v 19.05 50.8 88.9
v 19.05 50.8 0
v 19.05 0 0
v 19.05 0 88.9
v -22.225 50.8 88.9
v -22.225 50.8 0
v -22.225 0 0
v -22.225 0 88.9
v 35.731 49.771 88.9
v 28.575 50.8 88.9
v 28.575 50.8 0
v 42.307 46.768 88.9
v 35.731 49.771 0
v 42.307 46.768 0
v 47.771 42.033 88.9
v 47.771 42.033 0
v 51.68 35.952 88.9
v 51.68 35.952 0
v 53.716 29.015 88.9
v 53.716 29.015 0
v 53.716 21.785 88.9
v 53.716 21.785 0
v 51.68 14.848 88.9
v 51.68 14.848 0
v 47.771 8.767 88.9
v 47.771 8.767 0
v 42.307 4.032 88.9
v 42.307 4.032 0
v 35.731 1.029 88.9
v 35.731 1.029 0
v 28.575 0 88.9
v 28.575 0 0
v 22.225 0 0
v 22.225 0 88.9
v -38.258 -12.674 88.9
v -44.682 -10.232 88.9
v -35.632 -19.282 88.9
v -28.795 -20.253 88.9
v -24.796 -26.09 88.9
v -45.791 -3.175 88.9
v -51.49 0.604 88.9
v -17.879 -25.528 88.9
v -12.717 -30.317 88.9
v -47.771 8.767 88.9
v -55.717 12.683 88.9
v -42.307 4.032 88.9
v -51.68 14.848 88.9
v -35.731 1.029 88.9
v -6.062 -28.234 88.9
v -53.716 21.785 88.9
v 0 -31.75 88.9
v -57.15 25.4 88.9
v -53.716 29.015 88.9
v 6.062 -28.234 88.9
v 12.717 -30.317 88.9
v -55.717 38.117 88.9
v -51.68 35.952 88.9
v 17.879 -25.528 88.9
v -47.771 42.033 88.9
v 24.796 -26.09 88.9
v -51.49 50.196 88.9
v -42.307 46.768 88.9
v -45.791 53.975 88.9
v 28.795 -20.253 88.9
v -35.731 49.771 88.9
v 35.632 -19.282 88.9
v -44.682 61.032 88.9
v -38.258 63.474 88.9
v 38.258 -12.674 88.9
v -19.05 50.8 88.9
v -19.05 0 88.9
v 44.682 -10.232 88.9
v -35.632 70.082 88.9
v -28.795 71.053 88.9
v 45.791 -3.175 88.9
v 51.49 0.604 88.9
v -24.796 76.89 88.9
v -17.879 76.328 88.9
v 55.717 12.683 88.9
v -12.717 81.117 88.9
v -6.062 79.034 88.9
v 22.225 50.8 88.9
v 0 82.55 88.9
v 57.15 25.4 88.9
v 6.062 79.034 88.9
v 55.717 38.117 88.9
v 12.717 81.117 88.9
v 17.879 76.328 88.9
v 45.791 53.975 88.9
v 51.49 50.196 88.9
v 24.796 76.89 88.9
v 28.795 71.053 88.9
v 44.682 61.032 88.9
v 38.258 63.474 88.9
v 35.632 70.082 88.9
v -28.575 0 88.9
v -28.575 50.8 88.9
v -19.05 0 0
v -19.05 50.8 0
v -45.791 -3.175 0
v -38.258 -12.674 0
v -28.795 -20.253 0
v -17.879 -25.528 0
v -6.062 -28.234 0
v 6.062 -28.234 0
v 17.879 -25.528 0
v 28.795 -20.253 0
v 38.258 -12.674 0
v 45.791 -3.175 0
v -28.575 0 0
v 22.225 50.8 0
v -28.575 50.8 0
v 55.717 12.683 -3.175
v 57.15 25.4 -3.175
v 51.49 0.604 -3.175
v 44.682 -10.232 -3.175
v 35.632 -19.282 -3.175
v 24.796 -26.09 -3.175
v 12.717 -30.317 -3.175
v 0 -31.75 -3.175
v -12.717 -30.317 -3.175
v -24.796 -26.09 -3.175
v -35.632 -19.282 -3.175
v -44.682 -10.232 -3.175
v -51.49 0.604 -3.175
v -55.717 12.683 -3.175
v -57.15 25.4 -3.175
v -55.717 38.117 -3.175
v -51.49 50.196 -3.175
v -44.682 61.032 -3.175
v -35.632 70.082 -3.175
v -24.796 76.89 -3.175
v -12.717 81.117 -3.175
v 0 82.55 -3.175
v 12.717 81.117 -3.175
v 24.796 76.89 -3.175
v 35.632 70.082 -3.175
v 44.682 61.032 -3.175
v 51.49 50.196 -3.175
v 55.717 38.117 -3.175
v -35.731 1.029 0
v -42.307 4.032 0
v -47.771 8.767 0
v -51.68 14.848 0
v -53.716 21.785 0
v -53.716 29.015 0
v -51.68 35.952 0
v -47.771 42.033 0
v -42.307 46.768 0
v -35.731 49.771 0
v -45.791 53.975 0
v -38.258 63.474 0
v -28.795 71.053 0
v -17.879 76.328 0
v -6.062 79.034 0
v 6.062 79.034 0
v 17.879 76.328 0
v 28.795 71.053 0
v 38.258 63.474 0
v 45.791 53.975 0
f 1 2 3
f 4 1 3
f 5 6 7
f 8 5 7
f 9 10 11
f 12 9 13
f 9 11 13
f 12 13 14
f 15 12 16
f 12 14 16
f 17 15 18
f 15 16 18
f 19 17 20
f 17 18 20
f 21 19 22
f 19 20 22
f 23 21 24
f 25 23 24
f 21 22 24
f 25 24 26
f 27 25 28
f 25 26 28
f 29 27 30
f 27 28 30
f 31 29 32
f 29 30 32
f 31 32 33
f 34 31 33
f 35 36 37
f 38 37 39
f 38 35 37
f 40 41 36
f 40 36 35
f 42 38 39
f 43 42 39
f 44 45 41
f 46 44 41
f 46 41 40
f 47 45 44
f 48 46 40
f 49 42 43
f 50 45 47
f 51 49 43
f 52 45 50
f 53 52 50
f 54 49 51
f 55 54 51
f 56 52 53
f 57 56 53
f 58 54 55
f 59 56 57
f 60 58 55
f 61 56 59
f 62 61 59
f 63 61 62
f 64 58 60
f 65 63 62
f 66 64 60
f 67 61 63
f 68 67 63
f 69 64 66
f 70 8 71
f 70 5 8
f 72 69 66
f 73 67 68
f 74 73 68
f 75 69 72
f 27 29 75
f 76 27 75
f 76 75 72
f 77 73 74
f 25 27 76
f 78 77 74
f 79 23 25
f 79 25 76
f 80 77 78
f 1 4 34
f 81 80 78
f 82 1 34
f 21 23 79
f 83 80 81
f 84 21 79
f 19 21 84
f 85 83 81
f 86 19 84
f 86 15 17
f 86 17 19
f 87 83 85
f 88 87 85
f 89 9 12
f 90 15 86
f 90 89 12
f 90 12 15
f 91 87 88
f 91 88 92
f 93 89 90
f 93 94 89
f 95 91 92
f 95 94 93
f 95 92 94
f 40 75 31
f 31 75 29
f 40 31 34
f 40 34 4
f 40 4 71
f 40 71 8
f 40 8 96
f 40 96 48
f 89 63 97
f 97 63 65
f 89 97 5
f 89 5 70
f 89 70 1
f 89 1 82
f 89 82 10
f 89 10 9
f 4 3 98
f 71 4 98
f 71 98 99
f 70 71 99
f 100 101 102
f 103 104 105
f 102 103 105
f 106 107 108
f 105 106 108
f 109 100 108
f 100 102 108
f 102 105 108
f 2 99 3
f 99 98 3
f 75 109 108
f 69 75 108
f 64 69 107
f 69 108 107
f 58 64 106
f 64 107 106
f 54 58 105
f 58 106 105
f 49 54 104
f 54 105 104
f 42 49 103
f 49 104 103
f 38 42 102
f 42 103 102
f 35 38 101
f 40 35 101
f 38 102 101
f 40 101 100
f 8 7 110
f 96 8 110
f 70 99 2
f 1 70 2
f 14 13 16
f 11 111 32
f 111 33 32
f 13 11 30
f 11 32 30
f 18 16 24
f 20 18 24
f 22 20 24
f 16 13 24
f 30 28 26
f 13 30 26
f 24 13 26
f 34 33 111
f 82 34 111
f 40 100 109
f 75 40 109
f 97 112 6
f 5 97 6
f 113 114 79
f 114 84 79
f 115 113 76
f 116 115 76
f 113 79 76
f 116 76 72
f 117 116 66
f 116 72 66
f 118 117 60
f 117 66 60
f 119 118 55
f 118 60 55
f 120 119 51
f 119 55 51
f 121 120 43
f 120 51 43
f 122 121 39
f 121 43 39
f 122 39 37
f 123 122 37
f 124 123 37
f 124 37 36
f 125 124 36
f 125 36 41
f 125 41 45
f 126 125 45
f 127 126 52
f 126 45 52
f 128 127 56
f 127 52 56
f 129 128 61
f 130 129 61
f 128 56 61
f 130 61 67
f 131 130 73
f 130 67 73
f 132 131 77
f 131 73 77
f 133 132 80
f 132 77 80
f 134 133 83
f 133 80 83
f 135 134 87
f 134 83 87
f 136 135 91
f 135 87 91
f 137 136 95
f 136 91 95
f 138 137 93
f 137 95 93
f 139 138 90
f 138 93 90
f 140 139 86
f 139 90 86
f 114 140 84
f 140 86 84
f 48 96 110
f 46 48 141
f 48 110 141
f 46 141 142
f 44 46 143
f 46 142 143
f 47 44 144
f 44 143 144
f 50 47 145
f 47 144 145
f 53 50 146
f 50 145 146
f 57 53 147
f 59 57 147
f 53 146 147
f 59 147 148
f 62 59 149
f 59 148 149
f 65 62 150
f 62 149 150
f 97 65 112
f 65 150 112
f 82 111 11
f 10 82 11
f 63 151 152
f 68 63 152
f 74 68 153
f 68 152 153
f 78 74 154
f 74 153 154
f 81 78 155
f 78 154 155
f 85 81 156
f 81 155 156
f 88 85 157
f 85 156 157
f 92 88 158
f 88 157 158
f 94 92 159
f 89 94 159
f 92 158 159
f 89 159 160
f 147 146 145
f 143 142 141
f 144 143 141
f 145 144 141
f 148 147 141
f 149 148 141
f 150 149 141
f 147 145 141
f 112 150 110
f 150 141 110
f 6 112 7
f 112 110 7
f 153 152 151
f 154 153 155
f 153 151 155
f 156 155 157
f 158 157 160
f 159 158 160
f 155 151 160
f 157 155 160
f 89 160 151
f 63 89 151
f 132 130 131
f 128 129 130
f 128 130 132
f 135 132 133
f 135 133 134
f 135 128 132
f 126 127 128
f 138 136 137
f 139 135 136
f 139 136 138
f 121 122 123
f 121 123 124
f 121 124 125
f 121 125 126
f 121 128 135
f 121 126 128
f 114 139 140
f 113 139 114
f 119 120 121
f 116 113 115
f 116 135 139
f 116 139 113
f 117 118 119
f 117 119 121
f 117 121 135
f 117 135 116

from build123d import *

# Parameters (mm, degrees)
F2_R     = 57.15
F3_DEPTH = 88.9
F0_R     = 57.15
F1_DEPTH = 3.175


# Not quite as in the source:
# - a feature names something its author has since deleted; it is built from what else it names


with BuildPart() as f3:
    # F2 (on Top) → F3 (new body)
    with BuildSketch(Plane.XY):
        with Locations((0, 25.4)):
            Circle(F2_R)
        with BuildLine():
            ThreePointArc((45.7905011984, -3.175), (0, -28.575), (-45.7905011984, -3.175))
            Line((-45.7905011984, -3.175), (45.7905011984, -3.175))
        make_face(mode=Mode.SUBTRACT)
        with BuildLine():
            Line((-22.225, 50.8), (-22.225, 0))
            Line((-22.225, 0), (-28.575, 0))
            ThreePointArc((-28.575, 0), (-53.975, 25.4), (-28.575, 50.8))
            Line((-28.575, 50.8), (-22.225, 50.8))
        make_face(mode=Mode.SUBTRACT)
        Polygon((19.05, 0), (0, 0), (-19.05, 0), (-19.05, 50.8), (0, 50.8), (19.05, 50.8), align=None, mode=Mode.SUBTRACT)
        with BuildLine():
            Line((28.575, 0), (22.225, 0))
            Line((22.225, 0), (22.225, 50.8))
            Line((22.225, 50.8), (28.575, 50.8))
            ThreePointArc((28.575, 50.8), (53.975, 25.4), (28.575, 0))
        make_face(mode=Mode.SUBTRACT)
        with BuildLine():
            Line((45.7905011984, 53.975), (-45.7905011984, 53.975))
            ThreePointArc((-45.7905011984, 53.975), (0, 79.375), (45.7905011984, 53.975))
        make_face(mode=Mode.SUBTRACT)
    extrude(amount=F3_DEPTH)

    # F0 (on face) → F1 (join)
    with BuildSketch(Plane(origin=(0, 0, 0), x_dir=(1, 0, 0), z_dir=(0, 0, -1))):
        with Locations((0, -25.4)):
            Circle(F0_R)
    extrude(amount=F1_DEPTH)


solid = f3.part
